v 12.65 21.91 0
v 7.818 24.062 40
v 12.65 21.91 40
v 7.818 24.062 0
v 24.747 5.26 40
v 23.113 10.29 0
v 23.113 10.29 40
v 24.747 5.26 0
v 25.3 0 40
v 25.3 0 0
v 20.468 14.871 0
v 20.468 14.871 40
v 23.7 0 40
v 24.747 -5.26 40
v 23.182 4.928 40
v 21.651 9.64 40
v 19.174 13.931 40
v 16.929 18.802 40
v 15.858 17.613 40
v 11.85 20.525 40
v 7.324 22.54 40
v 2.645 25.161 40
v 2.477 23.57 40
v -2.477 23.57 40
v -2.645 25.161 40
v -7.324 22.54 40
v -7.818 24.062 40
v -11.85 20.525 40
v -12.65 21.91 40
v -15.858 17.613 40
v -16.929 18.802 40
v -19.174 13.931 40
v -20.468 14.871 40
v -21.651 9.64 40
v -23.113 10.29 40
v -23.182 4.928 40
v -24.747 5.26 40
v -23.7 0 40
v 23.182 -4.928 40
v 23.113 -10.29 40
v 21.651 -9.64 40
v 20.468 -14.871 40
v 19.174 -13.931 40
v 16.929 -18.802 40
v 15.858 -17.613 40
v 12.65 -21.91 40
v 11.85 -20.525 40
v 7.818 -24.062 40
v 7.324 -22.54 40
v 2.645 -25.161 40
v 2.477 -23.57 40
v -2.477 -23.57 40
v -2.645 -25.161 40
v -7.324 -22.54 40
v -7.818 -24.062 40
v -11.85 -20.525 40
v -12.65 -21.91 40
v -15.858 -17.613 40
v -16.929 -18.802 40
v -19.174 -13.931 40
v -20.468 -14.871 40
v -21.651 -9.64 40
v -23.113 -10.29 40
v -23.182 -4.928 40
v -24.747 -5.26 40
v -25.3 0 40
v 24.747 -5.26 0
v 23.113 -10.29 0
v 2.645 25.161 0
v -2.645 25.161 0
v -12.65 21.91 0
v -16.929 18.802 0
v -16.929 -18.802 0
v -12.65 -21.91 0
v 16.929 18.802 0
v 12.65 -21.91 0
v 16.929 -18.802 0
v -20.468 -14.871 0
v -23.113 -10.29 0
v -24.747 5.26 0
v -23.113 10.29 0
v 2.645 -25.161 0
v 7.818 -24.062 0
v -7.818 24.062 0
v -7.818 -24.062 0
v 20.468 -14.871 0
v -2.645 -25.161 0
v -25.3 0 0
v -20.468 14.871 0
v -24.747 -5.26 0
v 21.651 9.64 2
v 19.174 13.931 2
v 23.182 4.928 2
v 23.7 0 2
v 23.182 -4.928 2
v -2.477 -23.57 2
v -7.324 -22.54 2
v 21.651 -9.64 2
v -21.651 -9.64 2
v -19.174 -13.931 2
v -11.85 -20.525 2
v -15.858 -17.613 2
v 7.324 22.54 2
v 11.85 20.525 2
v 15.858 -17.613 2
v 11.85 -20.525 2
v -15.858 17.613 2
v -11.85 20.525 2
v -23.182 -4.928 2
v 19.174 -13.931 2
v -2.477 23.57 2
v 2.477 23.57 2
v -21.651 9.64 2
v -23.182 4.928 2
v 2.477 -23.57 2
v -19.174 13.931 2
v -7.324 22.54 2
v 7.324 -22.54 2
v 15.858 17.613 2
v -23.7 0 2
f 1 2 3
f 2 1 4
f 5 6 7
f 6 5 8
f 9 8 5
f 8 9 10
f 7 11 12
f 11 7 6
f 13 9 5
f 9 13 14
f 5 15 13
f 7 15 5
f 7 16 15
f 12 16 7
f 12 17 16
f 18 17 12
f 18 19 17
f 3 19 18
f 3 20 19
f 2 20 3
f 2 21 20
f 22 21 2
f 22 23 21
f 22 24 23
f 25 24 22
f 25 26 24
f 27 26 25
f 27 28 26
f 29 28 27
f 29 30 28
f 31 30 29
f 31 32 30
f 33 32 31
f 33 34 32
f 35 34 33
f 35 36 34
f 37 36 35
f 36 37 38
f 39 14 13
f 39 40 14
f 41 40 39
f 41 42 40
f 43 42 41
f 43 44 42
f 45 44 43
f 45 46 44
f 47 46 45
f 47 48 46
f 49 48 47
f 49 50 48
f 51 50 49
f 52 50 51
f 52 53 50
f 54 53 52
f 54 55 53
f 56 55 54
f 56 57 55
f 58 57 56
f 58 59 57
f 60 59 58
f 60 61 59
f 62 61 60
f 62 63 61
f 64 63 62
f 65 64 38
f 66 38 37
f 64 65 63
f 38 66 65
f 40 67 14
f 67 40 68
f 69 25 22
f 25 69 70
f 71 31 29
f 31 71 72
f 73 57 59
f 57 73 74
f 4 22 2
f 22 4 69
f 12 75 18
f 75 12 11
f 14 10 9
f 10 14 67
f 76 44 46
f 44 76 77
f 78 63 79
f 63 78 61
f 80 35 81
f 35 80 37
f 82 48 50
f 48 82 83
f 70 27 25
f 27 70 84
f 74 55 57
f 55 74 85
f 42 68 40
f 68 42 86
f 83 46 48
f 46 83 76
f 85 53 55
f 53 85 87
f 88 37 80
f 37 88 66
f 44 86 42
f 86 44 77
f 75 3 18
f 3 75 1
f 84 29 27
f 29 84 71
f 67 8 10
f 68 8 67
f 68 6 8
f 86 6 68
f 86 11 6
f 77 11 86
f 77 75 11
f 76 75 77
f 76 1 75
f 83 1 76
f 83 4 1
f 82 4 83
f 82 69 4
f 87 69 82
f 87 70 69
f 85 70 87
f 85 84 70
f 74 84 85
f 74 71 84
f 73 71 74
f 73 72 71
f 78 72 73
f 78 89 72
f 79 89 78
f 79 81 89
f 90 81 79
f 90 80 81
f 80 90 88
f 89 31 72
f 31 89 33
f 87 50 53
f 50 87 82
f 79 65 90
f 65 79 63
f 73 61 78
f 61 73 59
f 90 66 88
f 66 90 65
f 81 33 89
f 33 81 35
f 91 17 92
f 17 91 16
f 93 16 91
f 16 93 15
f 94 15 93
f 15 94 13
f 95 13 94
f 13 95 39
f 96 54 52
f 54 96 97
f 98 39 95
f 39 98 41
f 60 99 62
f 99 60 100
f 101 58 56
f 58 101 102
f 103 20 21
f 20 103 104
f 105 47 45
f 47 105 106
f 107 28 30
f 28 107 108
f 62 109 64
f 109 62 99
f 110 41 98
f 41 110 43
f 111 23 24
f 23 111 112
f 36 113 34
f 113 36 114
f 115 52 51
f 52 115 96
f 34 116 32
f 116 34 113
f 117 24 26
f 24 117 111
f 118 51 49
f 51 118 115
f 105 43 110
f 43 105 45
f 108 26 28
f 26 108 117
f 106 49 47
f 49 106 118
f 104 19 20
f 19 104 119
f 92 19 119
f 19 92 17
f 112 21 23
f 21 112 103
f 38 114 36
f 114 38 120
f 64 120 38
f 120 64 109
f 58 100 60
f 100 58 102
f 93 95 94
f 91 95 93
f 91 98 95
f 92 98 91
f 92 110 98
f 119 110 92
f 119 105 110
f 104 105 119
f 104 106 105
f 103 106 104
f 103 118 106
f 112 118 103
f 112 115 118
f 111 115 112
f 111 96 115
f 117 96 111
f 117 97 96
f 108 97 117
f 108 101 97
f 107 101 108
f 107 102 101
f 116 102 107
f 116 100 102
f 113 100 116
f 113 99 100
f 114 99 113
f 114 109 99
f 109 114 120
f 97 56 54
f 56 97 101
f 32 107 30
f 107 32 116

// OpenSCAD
//////////////////////////////////////////////
//  ***TeMoG - Tentacle Mold Generator***   //
//  by Jonas Jørgensen (jonj@sdu.dk) 2020   //
//                                          //
//  Shared under a Creative Commons         //
//  Attribution-ShareAlike (CC BY-SA 3.0)   //
//  license                                 //
//////////////////////////////////////////////

//Part 4b - Finishing Mold - smaller version

$fn=30; //Set to 200 when generating the molds for 3D printing

//Main cone and mold
h = 180; //Cone height
maxDiam = 45; //Cone
minDiam = 35; //Cone
centerSolidDiam=15;
moldWallThickness = 3;
footDiam=100; //Foot for mold
siliconeThickness=3; //Outer
dividersThickness = 5;

////Assembly on the sides of mold////
numberOfHoles = 4;
screwSize=5;
assemblyWidth= 22;

//Bottom
straightHeightBottom = 20;
bottomThickness=3.5;
LDRHolderThickness = 8 +2.5;
LDRHolderDiam= minDiam+3;
delta=0.4;
LDRHoleDepth=8;
LDRDiam=6; 
LDRWireHolesDist=3;
LDRHoleDist=LDRHolderDiam/2-LDRDiam;
LDRNumber=3;

//Top part
straightHeight= 30; 
wiresDiameter=5; 

//Joints
jointThickness = 3;

//Finishing mold:
finMoldHeight=25;
finMoldWidth=30;
supportMoldLength=60;
supportMoldWidth=30;
FinalBottomThickness =8;

//Main cone
difference(){

union() {
cylinder(40,d2=maxDiam+moldWallThickness*2-0.4,d1=maxDiam+moldWallThickness*2-0.4); //Solid cylinder
    }    

translate ([0,0,2]) cylinder(40,d2=maxDiam+moldWallThickness*2-4+0.4, d1=maxDiam+moldWallThickness*2-4+0.4); //Erase cylinder
}
